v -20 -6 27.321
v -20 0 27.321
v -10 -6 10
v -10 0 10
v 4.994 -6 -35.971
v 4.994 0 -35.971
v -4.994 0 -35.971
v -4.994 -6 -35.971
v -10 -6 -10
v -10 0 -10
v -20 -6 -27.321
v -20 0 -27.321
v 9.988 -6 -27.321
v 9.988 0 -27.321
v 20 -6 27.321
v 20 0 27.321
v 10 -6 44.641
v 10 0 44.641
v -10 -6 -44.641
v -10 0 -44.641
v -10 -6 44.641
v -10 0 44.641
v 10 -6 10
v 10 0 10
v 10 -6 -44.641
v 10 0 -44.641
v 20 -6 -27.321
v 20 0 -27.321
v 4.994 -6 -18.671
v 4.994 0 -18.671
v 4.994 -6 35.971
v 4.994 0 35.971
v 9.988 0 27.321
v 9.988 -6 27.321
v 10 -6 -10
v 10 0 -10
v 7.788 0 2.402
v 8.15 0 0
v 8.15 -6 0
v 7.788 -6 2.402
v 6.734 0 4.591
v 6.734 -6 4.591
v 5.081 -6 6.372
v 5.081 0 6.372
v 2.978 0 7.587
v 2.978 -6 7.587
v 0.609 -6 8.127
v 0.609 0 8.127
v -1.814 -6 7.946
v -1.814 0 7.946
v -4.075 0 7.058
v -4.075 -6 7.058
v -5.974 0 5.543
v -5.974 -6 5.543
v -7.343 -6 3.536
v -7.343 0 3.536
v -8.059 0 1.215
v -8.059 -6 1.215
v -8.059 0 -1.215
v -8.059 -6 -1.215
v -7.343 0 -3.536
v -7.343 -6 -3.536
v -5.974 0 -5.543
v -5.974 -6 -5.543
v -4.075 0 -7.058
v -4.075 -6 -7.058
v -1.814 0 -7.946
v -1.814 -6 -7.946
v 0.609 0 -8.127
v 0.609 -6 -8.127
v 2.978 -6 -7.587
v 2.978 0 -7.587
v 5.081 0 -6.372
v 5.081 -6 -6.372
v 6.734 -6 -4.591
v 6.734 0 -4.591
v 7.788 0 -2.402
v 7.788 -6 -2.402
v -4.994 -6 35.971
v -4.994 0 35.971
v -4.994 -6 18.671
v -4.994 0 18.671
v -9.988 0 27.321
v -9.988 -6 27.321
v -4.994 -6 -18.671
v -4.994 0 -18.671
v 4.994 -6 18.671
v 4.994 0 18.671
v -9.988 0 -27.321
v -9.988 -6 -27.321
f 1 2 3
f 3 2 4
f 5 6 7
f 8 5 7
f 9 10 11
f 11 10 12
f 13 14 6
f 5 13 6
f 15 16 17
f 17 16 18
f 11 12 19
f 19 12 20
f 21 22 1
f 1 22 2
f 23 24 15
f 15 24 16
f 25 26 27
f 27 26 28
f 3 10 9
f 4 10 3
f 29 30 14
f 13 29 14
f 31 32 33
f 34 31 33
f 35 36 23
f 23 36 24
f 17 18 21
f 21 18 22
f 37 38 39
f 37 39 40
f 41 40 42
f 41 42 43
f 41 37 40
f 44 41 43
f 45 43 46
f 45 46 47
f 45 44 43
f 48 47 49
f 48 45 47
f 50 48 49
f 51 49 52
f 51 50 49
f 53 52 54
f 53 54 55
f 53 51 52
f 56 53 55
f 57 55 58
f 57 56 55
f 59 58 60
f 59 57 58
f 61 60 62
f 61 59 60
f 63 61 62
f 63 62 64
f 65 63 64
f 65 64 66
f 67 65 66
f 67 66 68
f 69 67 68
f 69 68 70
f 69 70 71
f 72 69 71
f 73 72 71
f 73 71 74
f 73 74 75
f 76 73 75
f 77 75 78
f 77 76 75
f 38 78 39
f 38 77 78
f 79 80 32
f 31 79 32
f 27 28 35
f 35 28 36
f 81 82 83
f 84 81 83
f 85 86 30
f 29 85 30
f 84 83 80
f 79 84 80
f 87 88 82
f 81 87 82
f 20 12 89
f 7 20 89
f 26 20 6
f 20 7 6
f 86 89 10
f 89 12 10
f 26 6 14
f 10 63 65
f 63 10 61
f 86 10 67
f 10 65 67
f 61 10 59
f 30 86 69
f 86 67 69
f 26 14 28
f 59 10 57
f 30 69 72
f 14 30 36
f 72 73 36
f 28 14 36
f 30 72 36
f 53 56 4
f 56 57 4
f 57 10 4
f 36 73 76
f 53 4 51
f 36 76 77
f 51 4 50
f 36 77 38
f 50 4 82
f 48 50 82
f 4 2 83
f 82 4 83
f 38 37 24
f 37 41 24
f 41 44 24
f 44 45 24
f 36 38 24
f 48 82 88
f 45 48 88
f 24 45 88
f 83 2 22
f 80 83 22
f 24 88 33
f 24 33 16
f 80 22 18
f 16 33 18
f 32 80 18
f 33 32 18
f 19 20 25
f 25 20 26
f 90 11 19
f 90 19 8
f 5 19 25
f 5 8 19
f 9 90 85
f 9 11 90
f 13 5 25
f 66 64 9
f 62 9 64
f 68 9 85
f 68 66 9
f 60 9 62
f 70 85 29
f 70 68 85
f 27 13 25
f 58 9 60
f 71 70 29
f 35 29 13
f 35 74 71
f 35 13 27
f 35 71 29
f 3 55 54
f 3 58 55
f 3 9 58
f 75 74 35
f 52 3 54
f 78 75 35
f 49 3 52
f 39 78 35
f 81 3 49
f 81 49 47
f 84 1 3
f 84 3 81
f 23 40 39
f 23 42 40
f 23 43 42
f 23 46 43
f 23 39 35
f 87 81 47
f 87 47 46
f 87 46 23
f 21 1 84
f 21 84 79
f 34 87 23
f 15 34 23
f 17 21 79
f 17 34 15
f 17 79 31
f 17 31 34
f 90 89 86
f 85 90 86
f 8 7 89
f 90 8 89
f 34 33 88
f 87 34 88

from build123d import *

# Parameters (mm, degrees)
F0_W     = 20
F0_H     = 20
F0_R     = 8.15
F1_DEPTH = 6


with BuildPart() as f1:
    # F0 (on Front) → F1 (new body)
    with BuildSketch(Plane.XZ):
        Polygon((-10, 10), (10, 10), (20, 27.320508), (10, 44.641016), (-10, 44.641016), (-20, 27.320508), align=None)
        Polygon((4.99408, 35.970508), (9.98816, 27.320508), (4.99408, 18.670508), (-4.99408, 18.670508), (-9.98816, 27.320508), (-4.99408, 35.970508), align=None, mode=Mode.SUBTRACT)
        Rectangle(F0_W, F0_H)
        Circle(F0_R, mode=Mode.SUBTRACT)
        Polygon((20, -27.320508), (10, -10), (-10, -10), (-20, -27.320508), (-10, -44.641016), (10, -44.641016), align=None)
        Polygon((4.99408, -35.970508), (-4.99408, -35.970508), (-9.98816, -27.320508), (-4.99408, -18.670508), (4.99408, -18.670508), (9.98816, -27.320508), align=None, mode=Mode.SUBTRACT)
    extrude(amount=F1_DEPTH)


solid = f1.part
